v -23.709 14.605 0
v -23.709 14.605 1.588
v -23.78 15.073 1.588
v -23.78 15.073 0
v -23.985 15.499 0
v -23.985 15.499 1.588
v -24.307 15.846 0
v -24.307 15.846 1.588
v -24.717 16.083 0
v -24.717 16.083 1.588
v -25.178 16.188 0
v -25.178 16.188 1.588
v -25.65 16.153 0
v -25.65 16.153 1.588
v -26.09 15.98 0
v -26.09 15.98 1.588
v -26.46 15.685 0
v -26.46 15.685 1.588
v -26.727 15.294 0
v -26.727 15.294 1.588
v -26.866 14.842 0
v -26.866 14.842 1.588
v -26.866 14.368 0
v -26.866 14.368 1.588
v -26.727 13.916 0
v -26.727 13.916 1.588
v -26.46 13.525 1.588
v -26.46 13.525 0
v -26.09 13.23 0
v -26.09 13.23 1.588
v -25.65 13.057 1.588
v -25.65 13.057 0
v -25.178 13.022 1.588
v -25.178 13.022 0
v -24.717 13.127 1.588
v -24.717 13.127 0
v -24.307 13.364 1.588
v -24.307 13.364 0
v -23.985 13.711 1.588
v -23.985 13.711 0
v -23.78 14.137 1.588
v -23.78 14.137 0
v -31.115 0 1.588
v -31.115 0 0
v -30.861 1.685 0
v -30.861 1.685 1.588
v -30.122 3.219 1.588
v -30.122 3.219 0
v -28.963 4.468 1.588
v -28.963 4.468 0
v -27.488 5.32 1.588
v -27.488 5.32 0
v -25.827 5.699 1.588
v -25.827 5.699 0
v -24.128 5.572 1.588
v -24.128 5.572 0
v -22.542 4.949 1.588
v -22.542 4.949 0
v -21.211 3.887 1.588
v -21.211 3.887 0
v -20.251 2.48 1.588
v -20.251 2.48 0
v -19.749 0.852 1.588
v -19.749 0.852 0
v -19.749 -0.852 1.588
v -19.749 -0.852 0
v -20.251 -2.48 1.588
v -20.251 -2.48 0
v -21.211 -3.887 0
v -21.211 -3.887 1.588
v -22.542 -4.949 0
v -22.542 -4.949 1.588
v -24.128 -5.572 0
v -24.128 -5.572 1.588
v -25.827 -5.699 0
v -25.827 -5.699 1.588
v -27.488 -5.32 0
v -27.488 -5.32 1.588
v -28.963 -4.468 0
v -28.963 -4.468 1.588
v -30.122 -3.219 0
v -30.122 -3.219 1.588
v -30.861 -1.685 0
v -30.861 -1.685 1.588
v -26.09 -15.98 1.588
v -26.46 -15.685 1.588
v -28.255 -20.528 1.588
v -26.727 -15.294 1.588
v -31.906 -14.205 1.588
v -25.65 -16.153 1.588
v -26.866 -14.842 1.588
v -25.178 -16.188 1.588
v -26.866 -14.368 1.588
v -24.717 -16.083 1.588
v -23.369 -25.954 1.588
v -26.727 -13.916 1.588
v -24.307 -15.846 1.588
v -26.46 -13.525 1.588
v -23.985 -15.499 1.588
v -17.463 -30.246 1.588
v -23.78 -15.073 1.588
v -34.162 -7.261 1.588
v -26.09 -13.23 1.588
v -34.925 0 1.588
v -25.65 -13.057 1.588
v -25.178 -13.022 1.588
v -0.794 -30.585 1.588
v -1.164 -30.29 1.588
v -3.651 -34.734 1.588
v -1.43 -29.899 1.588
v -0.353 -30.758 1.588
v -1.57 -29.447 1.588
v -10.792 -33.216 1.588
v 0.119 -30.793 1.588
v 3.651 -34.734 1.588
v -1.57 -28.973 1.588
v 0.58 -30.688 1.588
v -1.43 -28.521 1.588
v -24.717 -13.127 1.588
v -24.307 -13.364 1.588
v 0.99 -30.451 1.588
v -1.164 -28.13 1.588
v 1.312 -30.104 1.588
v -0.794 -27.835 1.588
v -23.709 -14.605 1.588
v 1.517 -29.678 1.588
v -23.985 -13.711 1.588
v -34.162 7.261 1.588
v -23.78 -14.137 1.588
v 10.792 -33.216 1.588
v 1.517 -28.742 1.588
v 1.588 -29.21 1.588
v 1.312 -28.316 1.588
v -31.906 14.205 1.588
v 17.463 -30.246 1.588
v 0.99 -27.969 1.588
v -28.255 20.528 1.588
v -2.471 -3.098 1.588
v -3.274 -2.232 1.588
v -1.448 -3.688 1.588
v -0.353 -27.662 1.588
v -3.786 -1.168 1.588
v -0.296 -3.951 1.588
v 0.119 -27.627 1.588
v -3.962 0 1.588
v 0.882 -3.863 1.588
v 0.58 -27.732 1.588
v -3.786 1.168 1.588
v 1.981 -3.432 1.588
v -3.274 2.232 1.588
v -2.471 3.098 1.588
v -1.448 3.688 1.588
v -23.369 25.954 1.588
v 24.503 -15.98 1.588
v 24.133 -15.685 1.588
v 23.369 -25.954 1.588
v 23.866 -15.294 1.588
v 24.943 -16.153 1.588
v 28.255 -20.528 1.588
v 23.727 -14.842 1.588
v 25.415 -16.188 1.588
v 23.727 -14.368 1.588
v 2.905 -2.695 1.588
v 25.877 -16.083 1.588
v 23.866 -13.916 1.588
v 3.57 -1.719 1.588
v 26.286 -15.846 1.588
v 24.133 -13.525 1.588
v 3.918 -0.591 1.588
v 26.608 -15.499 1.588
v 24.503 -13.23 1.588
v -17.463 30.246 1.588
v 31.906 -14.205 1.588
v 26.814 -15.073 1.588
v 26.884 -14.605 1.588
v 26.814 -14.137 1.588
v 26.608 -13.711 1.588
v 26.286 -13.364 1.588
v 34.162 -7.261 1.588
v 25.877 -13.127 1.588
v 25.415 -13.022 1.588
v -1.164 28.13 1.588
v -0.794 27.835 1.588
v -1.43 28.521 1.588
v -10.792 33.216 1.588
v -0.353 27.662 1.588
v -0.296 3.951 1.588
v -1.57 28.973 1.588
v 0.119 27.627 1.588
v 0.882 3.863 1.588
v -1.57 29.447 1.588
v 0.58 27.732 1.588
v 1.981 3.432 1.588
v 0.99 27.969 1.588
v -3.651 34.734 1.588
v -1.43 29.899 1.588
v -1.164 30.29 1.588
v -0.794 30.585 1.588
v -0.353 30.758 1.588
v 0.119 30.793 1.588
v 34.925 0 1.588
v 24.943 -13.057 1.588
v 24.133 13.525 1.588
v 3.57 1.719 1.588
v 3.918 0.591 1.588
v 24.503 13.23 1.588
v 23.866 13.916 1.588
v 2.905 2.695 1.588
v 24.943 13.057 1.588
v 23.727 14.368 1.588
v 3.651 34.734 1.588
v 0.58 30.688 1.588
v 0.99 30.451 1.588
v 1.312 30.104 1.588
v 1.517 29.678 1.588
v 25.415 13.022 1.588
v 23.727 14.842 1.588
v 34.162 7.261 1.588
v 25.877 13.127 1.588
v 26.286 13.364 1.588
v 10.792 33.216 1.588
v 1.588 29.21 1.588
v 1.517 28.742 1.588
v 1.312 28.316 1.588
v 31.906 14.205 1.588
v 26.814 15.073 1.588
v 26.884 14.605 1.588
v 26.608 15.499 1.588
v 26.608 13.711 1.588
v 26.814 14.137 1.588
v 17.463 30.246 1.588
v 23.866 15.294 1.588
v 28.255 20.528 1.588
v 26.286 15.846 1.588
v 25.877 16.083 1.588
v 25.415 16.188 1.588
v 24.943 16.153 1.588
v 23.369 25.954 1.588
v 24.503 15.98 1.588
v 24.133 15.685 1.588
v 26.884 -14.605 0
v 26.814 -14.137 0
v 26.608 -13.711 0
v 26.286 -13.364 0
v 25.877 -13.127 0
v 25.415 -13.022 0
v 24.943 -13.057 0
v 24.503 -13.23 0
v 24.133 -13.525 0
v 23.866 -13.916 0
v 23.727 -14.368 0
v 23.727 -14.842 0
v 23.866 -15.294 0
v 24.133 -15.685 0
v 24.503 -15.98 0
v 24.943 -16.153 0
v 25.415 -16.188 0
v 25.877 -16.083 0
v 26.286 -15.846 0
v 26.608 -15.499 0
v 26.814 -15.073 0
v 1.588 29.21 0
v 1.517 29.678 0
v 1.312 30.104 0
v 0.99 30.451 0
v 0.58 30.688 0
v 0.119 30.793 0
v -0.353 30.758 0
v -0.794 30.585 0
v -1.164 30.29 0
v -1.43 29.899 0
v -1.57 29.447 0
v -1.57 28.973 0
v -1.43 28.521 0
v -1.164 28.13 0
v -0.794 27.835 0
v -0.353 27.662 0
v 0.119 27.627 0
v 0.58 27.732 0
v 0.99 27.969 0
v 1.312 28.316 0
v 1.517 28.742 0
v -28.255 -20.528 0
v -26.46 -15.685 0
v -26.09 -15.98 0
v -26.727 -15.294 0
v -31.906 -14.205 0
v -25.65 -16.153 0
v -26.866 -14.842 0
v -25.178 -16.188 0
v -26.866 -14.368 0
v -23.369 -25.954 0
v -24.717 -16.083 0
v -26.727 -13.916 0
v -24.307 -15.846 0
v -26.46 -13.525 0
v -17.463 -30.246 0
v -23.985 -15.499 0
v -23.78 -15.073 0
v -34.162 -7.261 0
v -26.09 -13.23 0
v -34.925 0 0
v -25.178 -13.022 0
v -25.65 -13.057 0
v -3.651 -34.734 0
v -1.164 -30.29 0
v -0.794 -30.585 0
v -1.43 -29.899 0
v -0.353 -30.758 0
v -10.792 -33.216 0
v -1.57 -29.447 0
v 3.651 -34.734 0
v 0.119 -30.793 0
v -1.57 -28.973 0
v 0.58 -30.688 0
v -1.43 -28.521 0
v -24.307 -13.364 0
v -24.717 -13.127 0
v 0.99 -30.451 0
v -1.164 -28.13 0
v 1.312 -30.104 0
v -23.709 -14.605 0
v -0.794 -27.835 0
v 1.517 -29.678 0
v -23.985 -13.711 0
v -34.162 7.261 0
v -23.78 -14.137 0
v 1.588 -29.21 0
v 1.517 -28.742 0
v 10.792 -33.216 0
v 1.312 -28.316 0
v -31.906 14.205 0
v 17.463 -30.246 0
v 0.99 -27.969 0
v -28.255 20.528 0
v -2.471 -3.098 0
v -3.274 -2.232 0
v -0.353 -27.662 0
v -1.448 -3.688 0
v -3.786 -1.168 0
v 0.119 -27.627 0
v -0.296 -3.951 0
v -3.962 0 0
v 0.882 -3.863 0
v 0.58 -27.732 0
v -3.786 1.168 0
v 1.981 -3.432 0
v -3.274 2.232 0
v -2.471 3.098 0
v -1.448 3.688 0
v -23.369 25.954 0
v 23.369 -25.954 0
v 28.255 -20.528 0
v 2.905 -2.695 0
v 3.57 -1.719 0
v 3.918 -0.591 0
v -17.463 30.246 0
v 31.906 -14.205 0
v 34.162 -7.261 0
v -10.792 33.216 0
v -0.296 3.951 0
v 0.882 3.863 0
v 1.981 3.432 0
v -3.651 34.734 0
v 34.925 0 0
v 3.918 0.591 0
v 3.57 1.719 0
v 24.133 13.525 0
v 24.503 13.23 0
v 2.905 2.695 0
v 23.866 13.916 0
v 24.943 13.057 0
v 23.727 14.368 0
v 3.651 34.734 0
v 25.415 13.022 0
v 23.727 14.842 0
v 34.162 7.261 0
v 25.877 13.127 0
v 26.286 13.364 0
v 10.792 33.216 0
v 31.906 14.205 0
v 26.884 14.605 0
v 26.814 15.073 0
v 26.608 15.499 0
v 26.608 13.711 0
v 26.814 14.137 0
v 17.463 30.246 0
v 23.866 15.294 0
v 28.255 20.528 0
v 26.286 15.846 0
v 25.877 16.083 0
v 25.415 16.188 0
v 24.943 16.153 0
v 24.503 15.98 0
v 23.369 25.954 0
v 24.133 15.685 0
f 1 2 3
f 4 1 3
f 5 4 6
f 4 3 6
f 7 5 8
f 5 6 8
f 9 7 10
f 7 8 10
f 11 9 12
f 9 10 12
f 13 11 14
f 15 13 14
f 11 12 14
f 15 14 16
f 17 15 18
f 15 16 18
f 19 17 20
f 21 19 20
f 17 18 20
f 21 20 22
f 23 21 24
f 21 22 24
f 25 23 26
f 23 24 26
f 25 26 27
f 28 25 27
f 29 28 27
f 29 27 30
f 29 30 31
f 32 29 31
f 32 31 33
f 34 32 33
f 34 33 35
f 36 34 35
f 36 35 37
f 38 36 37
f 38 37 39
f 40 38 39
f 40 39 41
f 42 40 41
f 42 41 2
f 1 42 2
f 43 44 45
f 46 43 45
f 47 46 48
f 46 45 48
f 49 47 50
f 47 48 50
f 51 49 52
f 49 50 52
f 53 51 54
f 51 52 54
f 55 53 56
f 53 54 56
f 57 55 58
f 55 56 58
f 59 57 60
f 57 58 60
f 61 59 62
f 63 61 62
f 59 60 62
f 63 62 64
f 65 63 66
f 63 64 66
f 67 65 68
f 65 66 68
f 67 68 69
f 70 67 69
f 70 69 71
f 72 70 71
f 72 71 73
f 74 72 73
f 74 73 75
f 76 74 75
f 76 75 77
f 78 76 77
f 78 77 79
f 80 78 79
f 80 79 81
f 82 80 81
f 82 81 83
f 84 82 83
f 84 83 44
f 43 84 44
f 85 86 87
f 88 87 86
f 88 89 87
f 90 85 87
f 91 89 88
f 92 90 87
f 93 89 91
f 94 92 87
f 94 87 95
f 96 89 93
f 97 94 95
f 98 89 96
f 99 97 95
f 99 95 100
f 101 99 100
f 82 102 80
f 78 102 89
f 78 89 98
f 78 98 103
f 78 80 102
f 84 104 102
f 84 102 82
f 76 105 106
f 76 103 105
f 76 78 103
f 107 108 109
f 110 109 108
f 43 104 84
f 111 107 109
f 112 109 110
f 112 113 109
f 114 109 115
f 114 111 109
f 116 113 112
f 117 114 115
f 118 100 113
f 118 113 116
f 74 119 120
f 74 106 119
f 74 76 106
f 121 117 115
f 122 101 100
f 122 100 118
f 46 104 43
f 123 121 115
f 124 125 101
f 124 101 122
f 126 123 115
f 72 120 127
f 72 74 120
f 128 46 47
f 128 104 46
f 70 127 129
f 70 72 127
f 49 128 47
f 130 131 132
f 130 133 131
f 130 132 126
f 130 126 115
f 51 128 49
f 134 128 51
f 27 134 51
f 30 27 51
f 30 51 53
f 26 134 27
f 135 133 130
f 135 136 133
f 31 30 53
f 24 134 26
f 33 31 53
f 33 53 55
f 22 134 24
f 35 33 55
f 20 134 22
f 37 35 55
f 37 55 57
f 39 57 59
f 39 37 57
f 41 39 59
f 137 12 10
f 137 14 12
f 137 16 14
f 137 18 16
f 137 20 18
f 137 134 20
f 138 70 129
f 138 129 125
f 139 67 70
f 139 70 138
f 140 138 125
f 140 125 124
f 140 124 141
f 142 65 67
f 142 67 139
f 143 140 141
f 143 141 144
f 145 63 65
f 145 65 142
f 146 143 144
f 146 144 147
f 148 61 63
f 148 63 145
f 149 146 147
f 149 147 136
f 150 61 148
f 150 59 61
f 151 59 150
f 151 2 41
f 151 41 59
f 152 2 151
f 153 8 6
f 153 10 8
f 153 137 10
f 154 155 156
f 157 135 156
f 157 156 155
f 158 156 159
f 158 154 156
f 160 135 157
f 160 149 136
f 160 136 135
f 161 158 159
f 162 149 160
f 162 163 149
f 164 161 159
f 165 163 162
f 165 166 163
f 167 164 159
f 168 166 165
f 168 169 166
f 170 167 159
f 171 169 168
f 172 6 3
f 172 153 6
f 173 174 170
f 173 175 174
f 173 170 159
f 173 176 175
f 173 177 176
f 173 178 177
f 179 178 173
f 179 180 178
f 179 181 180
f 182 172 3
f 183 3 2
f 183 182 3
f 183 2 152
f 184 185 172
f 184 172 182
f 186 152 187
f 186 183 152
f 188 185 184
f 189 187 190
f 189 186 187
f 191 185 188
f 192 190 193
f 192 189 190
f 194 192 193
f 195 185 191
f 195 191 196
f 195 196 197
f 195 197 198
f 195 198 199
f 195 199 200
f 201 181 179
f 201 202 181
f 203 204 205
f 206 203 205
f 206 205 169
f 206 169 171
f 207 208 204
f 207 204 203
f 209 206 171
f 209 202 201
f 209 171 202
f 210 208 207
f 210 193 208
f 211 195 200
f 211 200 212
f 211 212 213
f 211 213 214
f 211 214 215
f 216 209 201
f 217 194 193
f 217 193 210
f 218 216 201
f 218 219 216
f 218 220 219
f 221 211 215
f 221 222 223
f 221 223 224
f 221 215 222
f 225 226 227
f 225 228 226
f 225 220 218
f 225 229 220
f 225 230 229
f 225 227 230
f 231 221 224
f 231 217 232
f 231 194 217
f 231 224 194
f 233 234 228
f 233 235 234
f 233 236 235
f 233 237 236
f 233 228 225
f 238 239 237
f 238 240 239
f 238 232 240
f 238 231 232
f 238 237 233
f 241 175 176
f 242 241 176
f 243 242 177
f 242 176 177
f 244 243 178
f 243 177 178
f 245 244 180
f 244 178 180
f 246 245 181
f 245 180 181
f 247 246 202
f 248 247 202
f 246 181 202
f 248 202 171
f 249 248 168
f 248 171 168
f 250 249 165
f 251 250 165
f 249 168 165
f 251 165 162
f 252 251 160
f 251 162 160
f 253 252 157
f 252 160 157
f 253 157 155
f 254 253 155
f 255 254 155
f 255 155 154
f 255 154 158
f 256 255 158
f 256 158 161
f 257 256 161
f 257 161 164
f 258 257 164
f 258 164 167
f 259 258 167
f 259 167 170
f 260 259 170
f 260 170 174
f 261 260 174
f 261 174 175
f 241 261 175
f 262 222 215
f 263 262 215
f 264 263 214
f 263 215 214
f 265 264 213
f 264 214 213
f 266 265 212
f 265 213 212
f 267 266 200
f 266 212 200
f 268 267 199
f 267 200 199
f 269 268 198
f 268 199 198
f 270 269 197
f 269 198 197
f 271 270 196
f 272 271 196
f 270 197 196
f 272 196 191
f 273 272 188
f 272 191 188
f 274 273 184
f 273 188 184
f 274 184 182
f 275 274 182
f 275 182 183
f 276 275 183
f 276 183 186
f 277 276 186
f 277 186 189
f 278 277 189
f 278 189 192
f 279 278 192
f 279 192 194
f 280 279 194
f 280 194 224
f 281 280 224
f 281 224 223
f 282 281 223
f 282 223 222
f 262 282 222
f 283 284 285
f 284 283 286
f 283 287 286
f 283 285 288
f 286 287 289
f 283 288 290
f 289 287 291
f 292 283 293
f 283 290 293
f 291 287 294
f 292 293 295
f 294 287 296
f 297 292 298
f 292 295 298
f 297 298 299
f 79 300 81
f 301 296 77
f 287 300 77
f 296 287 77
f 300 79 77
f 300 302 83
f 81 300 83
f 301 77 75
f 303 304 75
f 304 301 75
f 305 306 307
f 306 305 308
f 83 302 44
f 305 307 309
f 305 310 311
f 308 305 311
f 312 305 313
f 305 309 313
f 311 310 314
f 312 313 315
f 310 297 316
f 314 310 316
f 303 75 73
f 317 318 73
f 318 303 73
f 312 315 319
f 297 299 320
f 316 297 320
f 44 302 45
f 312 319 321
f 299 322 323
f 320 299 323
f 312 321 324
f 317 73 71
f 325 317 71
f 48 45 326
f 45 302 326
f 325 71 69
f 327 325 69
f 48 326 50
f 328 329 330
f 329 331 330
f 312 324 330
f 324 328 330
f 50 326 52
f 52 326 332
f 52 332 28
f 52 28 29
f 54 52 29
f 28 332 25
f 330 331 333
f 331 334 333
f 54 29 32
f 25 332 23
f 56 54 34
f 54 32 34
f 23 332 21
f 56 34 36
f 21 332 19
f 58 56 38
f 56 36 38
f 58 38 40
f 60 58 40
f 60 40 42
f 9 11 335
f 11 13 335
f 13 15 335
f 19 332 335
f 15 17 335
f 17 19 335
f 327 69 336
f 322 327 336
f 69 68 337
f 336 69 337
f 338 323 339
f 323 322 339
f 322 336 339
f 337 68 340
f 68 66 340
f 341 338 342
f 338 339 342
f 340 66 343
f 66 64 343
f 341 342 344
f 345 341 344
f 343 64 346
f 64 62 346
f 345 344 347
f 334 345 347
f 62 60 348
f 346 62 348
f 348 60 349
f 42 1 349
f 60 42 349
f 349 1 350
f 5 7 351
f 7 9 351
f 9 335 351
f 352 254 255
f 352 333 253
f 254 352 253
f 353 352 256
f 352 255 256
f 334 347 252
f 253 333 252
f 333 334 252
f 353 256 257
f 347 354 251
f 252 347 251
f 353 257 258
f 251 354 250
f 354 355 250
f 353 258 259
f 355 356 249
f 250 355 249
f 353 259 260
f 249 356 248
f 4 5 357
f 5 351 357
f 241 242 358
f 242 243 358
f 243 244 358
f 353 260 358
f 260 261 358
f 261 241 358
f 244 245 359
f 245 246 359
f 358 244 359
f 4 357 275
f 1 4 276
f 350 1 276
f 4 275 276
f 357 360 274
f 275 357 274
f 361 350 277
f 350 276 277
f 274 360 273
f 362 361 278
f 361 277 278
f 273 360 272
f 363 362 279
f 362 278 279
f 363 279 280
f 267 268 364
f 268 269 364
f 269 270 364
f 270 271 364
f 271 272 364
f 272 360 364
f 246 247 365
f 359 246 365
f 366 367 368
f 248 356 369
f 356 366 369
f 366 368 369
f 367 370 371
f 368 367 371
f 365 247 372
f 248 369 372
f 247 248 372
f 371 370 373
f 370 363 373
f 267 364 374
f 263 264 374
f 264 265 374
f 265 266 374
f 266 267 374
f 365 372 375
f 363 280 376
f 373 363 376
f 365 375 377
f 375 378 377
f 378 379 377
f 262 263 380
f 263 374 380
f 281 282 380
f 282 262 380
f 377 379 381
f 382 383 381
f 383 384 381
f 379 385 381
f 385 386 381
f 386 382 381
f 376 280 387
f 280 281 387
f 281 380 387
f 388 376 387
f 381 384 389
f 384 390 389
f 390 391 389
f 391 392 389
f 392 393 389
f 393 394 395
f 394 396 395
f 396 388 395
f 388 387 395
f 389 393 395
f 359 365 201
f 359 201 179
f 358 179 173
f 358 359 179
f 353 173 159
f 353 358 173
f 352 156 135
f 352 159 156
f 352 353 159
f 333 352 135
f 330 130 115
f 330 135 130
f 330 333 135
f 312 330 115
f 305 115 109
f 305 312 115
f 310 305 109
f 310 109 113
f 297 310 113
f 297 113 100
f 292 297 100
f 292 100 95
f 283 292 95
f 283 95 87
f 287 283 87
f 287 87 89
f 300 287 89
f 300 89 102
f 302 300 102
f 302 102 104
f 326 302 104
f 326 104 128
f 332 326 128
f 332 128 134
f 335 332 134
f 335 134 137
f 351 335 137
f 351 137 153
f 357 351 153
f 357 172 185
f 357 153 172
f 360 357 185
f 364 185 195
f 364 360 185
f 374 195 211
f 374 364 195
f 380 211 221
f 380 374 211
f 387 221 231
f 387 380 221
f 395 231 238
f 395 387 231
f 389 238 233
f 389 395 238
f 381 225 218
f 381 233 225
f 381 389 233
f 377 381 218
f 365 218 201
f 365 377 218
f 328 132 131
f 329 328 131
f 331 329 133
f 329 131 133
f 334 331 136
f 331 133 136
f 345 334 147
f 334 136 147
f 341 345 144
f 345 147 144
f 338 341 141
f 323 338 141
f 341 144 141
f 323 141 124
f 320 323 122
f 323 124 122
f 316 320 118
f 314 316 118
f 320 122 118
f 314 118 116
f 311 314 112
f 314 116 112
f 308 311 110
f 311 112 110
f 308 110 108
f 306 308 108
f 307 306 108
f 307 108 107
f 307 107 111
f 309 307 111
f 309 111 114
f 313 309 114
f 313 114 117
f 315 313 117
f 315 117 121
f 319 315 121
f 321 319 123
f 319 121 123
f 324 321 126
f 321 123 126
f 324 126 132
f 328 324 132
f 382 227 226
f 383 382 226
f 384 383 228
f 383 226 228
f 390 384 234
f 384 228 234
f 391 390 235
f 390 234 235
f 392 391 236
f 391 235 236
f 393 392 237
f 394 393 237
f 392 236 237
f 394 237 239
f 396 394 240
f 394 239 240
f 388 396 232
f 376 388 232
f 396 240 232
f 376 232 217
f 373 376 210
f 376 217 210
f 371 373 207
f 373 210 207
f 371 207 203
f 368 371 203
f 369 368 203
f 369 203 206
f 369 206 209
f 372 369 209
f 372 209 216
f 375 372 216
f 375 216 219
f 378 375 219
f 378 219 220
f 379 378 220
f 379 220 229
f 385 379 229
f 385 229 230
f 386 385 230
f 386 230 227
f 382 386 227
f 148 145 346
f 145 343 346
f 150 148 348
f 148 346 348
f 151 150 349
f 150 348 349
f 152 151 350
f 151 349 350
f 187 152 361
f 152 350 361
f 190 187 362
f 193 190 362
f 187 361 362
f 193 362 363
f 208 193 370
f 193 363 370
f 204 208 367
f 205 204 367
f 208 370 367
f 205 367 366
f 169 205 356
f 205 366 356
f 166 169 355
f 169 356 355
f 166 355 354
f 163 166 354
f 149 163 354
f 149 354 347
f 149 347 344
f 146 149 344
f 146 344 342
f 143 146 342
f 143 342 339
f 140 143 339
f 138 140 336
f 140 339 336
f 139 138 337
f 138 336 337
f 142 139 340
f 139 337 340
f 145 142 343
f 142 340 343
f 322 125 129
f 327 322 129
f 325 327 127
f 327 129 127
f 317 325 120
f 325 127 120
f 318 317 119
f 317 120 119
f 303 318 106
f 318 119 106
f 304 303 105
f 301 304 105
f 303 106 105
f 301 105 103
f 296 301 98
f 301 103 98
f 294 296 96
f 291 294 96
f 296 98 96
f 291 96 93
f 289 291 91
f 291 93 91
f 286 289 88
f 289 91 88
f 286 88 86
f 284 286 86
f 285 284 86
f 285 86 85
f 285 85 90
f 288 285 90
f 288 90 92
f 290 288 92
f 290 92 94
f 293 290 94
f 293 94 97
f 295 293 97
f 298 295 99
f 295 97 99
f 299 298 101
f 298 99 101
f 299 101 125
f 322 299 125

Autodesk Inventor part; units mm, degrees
ref_plane "YZ Plane" through (0, 0, 0) normal (1, 0, 0) x (0, 1, 0)
ref_plane "XZ Plane" through (0, 0, 0) normal (0, 1, 0) x (-1, 0, 0)
ref_plane "XY Plane" through (0, 0, 0) normal (0, 0, 1) x (1, 0, 0)
sketch "Sketch1" plane through (0, 0, 0) normal (0, 0, 1) x (1, 0, 0)
  circle A0 centre (0, 0) radius 34.925
  dimension "d0" = 69.85
extrude "Extrusion1" add sketch "Sketch1" along normal blind 1.5875
sketch "Sketch2" plane through (0, 0, 1.5875) normal (0, 0, 1) x (1, 0, 0)
  line L0 (0, 0) -> (0, 29.21)
  circle A0 centre (0, 29.21) radius 1.5875
  circle A1 centre (-25.2966, 14.605) radius 1.5875
  circle A2 centre (-25.2966, -14.605) radius 1.5875
  circle A3 centre (0, -29.21) radius 1.5875
  circle A4 centre (25.2966, -14.605) radius 1.5875
  circle A5 centre (25.2966, 14.605) radius 1.5875
  dimension "d3" = 29.21
  dimension "d4" = 3.175
  dimension "d7" = 360
extrude "Extrusion2" cut sketch "Sketch2" against normal blind 2.4765
sketch "Sketch3" plane through (0, 0, 0) normal (0, 0, -1) x (-1, 0, 0)
  line L0 (0, 0) -> (25.4, 0)
  circle A0 centre (25.4, 0) radius 5.715
  dimension "d11" = 25.4
  dimension "d12" = 11.43
extrude "Extrusion3" cut sketch "Sketch3" against normal blind 2.4765
sketch "Sketch4" plane through (0, 0, 0) normal (0, 0, -1) x (-1, 0, 0)
  circle A0 centre (0, 0) radius 3.9624
  dimension "d15" = 7.9248
extrude "Extrusion4" cut sketch "Sketch4" against normal blind 2.4765
properties part number "pistonSealingWallFront" material "ABS Plastic"
